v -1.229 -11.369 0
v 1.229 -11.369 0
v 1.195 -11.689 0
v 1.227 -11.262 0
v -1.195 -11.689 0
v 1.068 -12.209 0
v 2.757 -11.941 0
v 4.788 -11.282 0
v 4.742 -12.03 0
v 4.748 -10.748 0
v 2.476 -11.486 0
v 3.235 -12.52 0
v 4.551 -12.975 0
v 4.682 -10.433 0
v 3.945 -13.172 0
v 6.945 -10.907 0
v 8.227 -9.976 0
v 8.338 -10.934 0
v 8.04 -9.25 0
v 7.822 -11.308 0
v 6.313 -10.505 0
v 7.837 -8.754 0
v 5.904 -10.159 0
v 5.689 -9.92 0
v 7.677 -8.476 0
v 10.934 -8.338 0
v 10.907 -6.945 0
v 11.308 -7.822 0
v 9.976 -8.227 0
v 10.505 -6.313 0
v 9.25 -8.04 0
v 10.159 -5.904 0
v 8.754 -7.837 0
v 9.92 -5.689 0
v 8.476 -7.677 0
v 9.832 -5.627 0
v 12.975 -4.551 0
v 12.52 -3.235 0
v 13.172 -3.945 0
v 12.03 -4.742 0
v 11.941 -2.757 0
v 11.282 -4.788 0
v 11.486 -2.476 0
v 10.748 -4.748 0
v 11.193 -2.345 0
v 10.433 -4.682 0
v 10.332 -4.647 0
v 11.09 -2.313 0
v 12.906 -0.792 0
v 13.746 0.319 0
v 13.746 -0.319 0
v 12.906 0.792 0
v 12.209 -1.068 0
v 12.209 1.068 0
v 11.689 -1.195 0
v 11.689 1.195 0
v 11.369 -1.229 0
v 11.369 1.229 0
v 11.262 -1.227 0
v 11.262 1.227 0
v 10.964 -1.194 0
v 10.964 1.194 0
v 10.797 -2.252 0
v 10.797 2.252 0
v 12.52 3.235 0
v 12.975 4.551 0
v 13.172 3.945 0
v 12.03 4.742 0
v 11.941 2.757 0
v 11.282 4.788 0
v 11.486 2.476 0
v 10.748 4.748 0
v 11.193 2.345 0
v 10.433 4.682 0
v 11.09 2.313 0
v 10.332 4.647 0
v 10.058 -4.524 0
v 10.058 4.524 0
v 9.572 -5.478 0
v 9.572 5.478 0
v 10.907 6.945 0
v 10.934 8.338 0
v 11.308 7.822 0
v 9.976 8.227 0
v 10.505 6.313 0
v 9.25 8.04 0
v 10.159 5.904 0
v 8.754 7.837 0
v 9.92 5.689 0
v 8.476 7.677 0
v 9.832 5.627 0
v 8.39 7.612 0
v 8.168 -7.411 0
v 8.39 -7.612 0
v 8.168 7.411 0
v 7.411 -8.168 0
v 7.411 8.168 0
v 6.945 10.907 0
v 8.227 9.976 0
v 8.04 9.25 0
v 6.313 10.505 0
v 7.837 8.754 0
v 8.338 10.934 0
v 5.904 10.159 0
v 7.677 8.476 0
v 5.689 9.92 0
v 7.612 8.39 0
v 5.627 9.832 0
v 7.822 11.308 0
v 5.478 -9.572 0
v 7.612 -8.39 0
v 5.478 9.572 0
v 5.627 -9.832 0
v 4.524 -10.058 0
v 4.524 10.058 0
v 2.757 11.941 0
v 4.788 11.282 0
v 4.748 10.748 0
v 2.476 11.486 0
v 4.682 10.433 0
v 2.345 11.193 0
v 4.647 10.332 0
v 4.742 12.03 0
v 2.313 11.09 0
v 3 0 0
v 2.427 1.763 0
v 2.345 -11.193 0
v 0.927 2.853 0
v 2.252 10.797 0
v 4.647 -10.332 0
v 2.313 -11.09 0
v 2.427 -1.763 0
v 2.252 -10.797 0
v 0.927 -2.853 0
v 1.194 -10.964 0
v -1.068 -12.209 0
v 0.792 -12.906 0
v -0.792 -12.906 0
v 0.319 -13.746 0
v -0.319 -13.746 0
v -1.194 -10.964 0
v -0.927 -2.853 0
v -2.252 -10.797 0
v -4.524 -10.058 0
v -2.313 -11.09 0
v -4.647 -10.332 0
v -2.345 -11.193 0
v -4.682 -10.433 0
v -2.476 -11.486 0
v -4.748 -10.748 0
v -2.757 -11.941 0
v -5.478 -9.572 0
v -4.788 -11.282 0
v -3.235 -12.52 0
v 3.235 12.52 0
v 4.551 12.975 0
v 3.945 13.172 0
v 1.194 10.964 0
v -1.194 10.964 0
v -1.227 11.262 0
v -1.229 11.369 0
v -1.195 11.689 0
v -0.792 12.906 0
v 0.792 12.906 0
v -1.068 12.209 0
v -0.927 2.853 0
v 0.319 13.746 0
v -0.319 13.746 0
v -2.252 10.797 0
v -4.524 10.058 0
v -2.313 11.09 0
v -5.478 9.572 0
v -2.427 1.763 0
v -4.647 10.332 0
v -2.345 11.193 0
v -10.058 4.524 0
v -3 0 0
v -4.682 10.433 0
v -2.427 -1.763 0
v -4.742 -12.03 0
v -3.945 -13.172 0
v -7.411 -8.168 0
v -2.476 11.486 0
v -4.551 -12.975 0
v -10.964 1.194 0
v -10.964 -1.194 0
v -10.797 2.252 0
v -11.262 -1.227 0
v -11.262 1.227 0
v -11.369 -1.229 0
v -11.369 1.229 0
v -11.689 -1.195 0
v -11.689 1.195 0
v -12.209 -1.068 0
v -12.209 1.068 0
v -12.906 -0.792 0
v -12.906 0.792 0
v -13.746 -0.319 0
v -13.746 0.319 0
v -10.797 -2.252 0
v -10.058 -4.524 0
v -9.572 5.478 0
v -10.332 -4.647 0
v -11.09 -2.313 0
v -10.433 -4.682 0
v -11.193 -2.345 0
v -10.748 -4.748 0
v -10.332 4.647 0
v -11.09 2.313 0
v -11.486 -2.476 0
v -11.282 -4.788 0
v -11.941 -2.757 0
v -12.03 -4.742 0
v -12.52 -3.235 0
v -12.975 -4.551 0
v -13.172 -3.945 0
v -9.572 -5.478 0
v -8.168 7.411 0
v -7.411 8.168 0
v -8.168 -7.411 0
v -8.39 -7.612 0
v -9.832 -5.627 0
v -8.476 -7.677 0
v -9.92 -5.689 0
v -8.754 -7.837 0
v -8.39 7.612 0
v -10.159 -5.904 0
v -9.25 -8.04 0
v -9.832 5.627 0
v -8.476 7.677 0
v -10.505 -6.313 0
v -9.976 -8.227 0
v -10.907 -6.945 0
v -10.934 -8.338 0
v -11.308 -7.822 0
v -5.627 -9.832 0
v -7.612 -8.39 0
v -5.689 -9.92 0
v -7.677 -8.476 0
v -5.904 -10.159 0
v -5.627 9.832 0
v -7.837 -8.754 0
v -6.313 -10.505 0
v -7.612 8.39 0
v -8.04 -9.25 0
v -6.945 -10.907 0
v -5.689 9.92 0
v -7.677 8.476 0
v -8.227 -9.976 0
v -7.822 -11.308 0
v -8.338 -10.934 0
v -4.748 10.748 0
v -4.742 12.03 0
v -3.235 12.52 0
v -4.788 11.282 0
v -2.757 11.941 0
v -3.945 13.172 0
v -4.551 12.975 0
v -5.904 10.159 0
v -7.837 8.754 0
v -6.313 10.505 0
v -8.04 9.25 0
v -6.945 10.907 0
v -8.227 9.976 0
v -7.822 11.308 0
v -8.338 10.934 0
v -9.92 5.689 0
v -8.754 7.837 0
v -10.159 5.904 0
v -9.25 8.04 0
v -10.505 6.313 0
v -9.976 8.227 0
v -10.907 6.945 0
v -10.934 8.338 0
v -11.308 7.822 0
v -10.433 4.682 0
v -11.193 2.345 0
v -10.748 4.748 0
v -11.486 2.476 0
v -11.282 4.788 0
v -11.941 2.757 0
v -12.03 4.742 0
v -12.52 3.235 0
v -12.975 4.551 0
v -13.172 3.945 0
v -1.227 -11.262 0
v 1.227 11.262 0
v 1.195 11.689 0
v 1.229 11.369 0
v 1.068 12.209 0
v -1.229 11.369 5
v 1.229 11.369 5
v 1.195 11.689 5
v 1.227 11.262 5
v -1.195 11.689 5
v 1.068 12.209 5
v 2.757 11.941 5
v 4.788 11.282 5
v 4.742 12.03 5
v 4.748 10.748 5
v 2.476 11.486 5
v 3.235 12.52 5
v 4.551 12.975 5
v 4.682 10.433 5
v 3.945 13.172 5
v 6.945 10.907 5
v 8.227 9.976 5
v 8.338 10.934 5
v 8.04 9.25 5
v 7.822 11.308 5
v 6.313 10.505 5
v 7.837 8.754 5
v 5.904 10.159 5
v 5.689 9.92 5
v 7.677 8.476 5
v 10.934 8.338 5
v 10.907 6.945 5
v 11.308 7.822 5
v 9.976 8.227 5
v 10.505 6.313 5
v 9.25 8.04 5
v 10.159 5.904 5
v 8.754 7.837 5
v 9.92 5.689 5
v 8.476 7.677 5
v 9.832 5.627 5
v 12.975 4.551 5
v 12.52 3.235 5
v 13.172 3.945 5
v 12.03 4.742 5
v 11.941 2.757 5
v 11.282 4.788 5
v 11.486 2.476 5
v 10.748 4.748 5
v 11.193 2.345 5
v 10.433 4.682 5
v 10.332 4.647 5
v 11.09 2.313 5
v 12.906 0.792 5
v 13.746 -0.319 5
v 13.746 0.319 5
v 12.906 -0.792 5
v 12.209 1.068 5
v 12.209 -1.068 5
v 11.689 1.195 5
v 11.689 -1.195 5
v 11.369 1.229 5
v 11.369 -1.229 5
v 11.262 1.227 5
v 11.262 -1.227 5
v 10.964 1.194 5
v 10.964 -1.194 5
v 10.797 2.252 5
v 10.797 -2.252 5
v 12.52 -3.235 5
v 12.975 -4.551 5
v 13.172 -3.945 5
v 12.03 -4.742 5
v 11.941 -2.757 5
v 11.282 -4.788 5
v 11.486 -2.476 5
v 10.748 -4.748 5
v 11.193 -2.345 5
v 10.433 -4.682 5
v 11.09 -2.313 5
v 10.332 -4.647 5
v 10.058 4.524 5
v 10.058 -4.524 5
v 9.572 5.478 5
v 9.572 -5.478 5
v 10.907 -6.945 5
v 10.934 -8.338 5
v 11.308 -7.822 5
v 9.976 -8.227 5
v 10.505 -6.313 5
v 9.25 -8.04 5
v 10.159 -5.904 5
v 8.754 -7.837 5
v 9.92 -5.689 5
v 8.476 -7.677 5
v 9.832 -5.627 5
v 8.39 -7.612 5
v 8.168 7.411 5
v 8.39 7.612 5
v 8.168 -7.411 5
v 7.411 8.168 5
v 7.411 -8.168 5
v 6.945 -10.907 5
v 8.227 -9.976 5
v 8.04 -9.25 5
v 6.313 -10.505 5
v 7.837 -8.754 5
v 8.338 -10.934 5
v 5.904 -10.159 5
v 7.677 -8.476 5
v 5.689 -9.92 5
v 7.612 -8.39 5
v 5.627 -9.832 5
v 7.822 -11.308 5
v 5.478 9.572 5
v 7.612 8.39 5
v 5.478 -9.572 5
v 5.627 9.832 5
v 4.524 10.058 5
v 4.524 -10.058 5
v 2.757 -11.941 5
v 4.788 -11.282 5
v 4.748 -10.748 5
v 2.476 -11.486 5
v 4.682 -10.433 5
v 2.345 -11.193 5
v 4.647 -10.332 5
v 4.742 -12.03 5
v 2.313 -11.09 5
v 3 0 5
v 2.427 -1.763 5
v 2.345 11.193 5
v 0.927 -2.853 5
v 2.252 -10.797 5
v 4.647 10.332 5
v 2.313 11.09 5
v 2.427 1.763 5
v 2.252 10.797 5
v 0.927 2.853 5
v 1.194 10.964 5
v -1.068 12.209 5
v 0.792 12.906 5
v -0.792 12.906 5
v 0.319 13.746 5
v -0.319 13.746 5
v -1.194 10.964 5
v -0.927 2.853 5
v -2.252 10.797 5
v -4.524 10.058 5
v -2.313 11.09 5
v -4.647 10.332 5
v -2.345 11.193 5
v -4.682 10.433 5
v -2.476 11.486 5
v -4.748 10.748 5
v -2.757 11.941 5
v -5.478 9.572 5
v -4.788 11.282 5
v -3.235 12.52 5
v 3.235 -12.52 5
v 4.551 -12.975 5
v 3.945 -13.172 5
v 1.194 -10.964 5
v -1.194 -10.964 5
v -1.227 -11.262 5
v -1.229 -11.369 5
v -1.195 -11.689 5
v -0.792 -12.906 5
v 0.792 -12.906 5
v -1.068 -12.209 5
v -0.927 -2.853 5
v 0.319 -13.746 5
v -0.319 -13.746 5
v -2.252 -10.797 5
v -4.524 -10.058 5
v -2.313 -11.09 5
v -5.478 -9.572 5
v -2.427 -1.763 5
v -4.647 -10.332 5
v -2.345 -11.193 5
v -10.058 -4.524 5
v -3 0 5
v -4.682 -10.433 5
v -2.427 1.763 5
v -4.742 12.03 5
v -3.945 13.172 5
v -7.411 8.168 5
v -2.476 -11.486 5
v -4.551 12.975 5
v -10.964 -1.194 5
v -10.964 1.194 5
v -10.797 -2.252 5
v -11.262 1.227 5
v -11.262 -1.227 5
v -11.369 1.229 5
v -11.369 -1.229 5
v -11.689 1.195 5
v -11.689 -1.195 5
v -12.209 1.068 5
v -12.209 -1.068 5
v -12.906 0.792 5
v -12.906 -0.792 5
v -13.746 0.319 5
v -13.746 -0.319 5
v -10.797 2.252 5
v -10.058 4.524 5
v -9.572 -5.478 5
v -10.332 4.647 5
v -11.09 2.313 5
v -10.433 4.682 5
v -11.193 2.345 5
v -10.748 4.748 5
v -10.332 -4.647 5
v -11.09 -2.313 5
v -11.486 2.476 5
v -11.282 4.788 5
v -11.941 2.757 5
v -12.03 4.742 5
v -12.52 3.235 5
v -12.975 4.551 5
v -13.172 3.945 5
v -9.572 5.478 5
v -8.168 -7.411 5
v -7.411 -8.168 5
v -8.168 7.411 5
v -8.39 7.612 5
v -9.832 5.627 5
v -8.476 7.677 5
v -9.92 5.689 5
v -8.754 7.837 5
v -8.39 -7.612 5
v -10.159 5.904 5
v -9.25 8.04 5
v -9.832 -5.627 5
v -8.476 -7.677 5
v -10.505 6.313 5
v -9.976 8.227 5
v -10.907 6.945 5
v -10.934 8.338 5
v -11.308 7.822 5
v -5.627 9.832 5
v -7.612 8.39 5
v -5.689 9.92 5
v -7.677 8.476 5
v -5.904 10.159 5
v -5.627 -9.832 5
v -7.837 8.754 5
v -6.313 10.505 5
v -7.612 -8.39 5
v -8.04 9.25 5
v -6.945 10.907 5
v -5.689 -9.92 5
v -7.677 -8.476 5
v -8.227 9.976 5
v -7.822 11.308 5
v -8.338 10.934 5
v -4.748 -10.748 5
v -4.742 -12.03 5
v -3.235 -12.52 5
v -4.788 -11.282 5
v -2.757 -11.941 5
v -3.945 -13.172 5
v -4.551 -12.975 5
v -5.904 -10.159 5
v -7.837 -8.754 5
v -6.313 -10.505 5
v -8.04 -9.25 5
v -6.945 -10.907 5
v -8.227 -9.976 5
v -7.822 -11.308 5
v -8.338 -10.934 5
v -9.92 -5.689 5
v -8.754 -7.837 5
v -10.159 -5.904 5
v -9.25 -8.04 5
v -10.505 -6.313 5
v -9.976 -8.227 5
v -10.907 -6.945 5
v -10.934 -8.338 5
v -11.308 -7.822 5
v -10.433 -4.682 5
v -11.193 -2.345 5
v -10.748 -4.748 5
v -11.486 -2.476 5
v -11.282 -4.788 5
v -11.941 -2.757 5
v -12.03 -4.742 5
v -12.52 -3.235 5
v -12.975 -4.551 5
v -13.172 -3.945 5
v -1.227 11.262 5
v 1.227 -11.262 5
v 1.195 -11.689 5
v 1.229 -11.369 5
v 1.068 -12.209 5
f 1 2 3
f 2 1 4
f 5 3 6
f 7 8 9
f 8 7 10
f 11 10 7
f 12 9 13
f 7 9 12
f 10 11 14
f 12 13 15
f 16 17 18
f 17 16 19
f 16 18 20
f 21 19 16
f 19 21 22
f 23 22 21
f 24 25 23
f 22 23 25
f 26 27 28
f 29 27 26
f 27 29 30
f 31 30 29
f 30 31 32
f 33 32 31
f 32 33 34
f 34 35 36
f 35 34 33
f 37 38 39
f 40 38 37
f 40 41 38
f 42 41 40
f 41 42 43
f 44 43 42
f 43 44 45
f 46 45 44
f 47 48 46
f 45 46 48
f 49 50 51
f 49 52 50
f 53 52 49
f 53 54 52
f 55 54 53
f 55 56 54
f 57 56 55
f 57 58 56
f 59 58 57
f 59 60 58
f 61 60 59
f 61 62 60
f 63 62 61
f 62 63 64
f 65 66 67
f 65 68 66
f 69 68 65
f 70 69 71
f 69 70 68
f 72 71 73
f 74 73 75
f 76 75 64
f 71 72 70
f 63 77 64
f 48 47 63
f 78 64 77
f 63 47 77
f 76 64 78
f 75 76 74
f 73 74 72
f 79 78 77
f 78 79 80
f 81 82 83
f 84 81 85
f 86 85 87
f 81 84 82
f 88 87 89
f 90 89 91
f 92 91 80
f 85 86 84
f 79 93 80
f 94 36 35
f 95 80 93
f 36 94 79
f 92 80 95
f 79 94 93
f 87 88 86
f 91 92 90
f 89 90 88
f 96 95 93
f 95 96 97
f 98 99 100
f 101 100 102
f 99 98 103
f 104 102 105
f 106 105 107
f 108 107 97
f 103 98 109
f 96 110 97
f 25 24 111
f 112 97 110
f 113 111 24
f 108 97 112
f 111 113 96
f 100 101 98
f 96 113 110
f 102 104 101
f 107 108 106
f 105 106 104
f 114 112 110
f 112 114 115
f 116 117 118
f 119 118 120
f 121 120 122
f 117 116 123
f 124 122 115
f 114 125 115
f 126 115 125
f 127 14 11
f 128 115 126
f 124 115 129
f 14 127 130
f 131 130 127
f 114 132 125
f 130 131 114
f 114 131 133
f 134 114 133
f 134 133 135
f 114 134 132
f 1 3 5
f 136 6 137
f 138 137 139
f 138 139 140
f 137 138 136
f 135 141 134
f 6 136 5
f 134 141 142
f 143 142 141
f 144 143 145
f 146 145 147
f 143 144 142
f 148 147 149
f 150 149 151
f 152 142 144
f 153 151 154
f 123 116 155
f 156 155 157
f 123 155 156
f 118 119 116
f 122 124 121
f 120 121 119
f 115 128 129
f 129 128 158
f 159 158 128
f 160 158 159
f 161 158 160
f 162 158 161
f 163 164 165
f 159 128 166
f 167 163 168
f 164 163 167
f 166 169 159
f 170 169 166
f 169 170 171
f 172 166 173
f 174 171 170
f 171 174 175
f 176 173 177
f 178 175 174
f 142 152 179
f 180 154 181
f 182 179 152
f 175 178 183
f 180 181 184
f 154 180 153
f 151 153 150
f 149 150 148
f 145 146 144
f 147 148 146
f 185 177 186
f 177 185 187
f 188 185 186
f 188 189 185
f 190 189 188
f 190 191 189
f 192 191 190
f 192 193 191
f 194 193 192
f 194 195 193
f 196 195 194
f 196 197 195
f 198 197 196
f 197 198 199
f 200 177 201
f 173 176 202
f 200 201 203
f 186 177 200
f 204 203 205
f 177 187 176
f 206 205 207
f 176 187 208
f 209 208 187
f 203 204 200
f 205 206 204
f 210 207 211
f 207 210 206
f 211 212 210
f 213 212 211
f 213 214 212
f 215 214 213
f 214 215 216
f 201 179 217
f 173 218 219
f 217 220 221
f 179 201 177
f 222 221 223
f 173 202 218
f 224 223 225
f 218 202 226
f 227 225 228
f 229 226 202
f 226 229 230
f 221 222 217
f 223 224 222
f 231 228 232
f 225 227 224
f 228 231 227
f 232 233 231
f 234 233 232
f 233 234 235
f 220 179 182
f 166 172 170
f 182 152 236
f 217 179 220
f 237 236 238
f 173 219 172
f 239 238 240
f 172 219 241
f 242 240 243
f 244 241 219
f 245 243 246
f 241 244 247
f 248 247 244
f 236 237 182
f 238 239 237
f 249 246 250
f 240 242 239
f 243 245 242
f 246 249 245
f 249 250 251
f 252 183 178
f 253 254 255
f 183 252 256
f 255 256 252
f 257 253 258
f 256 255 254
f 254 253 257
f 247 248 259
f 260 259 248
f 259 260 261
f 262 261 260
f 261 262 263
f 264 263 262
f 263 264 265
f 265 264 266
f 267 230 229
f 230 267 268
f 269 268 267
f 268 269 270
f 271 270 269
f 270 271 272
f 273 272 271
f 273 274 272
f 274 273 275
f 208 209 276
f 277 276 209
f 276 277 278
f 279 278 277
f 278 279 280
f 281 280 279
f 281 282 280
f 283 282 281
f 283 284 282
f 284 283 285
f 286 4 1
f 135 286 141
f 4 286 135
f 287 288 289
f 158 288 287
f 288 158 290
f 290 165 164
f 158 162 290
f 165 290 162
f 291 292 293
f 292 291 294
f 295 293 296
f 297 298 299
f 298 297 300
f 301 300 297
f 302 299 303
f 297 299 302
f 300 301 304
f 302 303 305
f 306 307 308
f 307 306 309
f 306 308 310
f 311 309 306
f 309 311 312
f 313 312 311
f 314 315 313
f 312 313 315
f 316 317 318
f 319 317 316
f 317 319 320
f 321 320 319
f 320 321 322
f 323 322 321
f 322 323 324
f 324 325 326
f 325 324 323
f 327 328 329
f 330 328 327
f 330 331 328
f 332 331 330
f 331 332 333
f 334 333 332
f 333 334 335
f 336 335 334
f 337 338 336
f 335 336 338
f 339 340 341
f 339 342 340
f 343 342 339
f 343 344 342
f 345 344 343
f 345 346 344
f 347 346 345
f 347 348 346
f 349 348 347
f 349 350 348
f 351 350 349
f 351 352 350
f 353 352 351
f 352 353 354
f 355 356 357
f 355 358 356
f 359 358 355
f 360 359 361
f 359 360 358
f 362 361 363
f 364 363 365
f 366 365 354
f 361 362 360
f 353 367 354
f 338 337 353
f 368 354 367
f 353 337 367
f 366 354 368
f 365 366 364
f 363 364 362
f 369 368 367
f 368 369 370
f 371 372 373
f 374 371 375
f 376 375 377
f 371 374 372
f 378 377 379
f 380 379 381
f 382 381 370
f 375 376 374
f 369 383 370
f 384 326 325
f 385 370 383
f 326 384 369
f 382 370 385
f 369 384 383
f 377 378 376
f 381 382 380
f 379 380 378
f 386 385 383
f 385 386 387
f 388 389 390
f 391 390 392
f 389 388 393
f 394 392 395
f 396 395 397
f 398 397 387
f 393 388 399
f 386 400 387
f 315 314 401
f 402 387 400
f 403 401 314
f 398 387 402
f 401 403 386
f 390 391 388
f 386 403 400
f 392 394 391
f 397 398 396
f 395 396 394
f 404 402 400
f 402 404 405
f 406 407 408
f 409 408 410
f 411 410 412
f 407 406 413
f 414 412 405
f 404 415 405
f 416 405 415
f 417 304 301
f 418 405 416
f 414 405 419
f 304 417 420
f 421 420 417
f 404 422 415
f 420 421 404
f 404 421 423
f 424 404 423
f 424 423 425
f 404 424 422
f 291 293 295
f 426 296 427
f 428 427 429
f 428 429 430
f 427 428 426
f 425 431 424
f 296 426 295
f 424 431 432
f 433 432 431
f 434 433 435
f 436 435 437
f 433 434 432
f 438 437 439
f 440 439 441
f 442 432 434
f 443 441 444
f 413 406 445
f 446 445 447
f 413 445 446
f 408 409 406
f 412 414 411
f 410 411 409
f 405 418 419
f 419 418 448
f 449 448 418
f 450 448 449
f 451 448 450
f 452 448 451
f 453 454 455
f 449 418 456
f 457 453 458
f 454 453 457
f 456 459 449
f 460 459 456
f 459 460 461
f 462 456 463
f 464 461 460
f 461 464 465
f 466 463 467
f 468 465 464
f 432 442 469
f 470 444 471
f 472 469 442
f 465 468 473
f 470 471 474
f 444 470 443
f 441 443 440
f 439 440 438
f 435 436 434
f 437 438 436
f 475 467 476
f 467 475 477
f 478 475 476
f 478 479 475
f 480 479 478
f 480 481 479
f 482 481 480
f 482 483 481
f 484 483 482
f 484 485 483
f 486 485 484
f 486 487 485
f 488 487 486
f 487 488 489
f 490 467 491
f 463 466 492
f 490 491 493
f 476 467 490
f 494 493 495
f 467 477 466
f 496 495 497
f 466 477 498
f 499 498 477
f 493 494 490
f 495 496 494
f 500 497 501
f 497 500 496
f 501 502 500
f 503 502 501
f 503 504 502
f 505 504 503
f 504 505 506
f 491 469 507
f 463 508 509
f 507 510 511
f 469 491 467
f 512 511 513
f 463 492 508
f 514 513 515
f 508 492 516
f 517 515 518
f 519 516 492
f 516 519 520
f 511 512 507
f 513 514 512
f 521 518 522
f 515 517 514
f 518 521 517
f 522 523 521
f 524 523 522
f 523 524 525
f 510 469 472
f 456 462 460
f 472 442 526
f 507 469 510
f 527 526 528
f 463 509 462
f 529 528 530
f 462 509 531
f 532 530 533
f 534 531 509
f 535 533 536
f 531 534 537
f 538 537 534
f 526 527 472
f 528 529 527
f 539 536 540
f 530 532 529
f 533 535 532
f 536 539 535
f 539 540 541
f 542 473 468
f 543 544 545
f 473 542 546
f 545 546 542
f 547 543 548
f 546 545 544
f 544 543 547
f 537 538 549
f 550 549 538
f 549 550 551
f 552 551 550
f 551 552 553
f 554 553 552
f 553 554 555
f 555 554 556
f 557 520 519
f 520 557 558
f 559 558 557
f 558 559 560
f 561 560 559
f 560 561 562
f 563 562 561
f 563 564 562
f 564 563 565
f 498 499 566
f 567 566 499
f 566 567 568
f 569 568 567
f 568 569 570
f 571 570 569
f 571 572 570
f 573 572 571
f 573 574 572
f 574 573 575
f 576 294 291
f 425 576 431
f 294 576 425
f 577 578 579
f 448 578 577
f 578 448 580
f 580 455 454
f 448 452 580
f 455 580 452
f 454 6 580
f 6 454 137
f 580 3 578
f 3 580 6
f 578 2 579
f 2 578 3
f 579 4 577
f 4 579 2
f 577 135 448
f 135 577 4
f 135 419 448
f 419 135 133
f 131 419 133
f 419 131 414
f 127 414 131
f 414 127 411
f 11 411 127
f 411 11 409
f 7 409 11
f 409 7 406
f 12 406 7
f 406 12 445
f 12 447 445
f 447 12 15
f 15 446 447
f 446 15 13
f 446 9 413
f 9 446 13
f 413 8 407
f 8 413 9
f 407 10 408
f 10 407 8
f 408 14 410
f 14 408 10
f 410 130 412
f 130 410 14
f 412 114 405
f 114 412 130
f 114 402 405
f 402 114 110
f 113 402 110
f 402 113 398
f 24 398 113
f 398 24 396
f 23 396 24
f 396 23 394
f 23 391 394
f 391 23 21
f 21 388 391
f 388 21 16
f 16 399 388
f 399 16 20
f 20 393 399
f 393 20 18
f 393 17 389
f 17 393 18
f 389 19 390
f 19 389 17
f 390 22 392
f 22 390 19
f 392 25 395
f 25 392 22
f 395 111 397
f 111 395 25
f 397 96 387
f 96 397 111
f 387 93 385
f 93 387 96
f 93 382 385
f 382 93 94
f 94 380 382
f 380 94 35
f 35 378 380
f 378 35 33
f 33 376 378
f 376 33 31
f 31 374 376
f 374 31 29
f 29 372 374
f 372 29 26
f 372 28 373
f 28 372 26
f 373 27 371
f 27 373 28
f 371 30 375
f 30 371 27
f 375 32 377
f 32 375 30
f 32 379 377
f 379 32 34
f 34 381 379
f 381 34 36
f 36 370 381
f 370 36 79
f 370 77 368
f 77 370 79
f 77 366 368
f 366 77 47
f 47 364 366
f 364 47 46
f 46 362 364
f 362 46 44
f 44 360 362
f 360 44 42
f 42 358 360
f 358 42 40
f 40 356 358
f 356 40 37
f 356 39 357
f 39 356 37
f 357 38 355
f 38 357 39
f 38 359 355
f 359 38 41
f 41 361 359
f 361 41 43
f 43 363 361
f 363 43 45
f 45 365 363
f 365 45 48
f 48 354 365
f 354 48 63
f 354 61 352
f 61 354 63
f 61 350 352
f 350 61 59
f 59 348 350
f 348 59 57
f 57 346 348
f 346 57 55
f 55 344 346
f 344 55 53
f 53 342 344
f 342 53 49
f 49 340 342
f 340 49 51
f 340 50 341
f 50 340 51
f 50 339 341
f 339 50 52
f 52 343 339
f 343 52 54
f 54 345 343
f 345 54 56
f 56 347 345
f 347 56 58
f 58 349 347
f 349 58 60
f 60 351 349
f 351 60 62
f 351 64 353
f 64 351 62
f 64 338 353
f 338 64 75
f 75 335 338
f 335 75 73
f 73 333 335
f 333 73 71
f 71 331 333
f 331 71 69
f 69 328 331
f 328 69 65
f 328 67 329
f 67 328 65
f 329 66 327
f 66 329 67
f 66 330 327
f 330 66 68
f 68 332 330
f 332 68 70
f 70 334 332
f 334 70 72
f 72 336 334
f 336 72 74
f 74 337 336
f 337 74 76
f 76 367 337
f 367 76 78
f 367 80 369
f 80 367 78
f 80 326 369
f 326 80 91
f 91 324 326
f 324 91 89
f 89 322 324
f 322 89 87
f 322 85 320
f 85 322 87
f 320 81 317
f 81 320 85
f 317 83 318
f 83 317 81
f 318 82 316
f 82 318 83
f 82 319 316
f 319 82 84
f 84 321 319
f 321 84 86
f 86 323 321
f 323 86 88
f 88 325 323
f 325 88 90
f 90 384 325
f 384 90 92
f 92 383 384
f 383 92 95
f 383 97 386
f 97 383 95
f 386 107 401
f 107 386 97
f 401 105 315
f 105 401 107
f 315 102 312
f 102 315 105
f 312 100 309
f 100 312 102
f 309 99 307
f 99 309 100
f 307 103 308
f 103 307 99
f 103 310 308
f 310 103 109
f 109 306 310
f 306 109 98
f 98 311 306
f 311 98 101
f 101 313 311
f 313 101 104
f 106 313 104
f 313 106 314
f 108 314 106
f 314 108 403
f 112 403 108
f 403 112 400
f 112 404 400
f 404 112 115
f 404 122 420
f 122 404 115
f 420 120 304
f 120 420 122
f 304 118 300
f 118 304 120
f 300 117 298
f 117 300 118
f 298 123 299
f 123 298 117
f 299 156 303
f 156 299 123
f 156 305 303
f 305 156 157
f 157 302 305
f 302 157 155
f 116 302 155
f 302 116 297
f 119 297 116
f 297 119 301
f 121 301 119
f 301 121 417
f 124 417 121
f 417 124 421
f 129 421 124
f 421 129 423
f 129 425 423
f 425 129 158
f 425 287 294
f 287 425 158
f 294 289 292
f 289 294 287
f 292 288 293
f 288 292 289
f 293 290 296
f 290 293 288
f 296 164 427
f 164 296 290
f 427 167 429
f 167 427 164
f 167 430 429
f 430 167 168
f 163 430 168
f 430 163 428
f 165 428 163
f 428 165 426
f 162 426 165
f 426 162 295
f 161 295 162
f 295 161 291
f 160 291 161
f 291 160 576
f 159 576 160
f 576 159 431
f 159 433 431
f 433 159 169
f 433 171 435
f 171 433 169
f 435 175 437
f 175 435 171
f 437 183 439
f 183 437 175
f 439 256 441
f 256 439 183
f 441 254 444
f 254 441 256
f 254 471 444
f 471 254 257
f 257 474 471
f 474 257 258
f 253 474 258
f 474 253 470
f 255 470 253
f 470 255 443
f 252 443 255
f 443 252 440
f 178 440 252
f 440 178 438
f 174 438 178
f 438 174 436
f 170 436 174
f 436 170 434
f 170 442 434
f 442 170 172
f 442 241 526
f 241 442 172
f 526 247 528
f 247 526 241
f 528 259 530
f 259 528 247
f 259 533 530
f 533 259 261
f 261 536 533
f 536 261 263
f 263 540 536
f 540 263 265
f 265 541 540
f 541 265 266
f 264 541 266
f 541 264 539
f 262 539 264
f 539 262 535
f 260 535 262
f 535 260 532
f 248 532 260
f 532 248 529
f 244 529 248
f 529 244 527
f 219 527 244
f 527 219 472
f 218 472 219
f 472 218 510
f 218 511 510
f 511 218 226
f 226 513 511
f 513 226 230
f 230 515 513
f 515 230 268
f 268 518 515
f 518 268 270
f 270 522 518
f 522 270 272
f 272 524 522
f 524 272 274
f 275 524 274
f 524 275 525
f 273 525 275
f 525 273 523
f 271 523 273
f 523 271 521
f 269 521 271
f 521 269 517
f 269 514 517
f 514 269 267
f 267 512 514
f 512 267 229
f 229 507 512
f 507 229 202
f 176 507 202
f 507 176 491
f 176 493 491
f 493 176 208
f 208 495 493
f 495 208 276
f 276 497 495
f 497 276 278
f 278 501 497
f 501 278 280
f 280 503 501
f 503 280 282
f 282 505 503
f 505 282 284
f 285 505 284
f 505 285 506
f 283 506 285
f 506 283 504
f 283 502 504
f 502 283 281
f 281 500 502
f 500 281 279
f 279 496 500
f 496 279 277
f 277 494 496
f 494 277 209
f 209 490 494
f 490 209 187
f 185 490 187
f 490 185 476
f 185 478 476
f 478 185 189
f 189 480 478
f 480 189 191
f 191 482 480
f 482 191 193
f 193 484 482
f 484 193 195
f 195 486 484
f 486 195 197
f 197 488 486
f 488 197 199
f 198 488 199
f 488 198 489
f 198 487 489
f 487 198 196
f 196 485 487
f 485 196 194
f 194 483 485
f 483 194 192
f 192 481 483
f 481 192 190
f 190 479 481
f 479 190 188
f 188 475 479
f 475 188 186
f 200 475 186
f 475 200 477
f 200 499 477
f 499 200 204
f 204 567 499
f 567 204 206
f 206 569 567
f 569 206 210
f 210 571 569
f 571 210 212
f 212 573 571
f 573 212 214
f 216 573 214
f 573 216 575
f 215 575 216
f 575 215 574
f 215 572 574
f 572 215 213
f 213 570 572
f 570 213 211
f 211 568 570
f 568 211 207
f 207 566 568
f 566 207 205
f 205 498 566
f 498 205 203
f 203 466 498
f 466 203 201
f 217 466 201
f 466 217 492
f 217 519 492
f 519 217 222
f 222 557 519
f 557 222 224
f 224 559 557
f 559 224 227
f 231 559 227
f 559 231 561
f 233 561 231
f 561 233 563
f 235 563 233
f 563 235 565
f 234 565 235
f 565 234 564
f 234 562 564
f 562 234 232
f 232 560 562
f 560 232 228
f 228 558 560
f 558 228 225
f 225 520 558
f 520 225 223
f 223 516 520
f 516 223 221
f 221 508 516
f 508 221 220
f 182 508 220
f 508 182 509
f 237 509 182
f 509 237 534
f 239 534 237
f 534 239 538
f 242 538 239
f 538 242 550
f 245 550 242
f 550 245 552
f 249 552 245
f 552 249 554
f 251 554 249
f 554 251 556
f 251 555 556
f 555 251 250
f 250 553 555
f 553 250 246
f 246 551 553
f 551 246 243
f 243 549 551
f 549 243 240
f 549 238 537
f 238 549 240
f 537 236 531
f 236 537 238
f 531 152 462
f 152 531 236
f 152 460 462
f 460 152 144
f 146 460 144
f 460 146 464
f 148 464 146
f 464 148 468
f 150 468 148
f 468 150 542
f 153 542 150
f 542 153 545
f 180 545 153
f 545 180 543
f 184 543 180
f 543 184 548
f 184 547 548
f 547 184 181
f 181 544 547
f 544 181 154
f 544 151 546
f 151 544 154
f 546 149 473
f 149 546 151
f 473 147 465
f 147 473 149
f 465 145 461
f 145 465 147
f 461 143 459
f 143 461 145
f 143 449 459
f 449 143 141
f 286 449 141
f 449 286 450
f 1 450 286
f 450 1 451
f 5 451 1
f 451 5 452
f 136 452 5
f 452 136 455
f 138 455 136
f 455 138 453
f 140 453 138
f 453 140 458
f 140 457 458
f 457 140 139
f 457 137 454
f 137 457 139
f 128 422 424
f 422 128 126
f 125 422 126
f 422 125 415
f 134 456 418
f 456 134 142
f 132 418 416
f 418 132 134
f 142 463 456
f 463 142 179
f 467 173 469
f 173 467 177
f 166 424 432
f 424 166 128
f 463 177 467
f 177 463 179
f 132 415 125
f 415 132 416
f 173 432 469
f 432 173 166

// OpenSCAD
use <../libraries/MCAD/involute_gears.scad>

//test_gears();
//Gear();

pressure_angle = 25; //Normal - 28
hub_diameter = 0;
rim_width=0;
circles=0;
teeth=20;
pitch_diameter=25;
twist=0;
height=5;
bore_diameter = 6;

gear (number_of_teeth=teeth,
    diametral_pitch=teeth/pitch_diameter,
    pressure_angle=pressure_angle,
    clearance = 0.2,
    gear_thickness = height,
    rim_thickness = height,
    rim_width = rim_width,
    hub_thickness = height*2,
    hub_diameter = hub_diameter,
    bore_diameter = bore_diameter,
    circles=circles,
    twist = twist/teeth);

module SmoothHole() {
    translate([6.5,0,-1]) cylinder(r=1.5, h=10, $fn=6);
}

module WadeL_double_helix(){
	//Large WADE's Gear - Double Helix

	pressure_angle=30;
    hub_diameter = 0;
    rim_width = 0;
	circles=0;
	teeth=30;
	pitch=200;
	twist=250;
	height=40;
    bore_diameter = 4;

	difference(){
		union(){
		// половина шевронной шестерни
		gear (number_of_teeth=teeth,
			circular_pitch=pitch,
			pressure_angle=pressure_angle,
			clearance = 0.2,
			gear_thickness = height/2,
			rim_thickness = height/2,
			rim_width = rim_width,
			hub_thickness = height/2*1.5-2-1.5,
			hub_diameter = hub_diameter,
			bore_diameter = bore_diameter,
			circles=circles,
			twist = twist/teeth);
		// вторая половина шевронной шестерни
		mirror([0,0,50])
		gear (number_of_teeth=teeth,
			circular_pitch=pitch,
			pressure_angle=pressure_angle,
			clearance = 0.2,
			gear_thickness = height/2,
			rim_thickness = height/2,
			rim_width = rim_width,
			hub_thickness = height/2,
			hub_diameter=hub_diameter,
			bore_diameter=bore_diameter,
            circles=circles,
			twist=twist/teeth);
		}
	}
}

module Gear(){
	//Large WADE's Gear - Double Helix

	pressure_angle=30;
    hub_diameter = 0;
    rim_width = 0;
	circles=0;
	teeth=16;
	pitch=200;
	twist=0;
	height=5;
    bore_diameter = 4.1;

    gear (number_of_teeth=teeth,
        circular_pitch=pitch,
        pressure_angle=pressure_angle,
        clearance = 0.2,
        gear_thickness = height,
        rim_thickness = height,
        rim_width = rim_width,
        hub_thickness = height,
        hub_diameter = hub_diameter,
        bore_diameter = bore_diameter,
        circles=circles,
        twist = twist/teeth);
}
